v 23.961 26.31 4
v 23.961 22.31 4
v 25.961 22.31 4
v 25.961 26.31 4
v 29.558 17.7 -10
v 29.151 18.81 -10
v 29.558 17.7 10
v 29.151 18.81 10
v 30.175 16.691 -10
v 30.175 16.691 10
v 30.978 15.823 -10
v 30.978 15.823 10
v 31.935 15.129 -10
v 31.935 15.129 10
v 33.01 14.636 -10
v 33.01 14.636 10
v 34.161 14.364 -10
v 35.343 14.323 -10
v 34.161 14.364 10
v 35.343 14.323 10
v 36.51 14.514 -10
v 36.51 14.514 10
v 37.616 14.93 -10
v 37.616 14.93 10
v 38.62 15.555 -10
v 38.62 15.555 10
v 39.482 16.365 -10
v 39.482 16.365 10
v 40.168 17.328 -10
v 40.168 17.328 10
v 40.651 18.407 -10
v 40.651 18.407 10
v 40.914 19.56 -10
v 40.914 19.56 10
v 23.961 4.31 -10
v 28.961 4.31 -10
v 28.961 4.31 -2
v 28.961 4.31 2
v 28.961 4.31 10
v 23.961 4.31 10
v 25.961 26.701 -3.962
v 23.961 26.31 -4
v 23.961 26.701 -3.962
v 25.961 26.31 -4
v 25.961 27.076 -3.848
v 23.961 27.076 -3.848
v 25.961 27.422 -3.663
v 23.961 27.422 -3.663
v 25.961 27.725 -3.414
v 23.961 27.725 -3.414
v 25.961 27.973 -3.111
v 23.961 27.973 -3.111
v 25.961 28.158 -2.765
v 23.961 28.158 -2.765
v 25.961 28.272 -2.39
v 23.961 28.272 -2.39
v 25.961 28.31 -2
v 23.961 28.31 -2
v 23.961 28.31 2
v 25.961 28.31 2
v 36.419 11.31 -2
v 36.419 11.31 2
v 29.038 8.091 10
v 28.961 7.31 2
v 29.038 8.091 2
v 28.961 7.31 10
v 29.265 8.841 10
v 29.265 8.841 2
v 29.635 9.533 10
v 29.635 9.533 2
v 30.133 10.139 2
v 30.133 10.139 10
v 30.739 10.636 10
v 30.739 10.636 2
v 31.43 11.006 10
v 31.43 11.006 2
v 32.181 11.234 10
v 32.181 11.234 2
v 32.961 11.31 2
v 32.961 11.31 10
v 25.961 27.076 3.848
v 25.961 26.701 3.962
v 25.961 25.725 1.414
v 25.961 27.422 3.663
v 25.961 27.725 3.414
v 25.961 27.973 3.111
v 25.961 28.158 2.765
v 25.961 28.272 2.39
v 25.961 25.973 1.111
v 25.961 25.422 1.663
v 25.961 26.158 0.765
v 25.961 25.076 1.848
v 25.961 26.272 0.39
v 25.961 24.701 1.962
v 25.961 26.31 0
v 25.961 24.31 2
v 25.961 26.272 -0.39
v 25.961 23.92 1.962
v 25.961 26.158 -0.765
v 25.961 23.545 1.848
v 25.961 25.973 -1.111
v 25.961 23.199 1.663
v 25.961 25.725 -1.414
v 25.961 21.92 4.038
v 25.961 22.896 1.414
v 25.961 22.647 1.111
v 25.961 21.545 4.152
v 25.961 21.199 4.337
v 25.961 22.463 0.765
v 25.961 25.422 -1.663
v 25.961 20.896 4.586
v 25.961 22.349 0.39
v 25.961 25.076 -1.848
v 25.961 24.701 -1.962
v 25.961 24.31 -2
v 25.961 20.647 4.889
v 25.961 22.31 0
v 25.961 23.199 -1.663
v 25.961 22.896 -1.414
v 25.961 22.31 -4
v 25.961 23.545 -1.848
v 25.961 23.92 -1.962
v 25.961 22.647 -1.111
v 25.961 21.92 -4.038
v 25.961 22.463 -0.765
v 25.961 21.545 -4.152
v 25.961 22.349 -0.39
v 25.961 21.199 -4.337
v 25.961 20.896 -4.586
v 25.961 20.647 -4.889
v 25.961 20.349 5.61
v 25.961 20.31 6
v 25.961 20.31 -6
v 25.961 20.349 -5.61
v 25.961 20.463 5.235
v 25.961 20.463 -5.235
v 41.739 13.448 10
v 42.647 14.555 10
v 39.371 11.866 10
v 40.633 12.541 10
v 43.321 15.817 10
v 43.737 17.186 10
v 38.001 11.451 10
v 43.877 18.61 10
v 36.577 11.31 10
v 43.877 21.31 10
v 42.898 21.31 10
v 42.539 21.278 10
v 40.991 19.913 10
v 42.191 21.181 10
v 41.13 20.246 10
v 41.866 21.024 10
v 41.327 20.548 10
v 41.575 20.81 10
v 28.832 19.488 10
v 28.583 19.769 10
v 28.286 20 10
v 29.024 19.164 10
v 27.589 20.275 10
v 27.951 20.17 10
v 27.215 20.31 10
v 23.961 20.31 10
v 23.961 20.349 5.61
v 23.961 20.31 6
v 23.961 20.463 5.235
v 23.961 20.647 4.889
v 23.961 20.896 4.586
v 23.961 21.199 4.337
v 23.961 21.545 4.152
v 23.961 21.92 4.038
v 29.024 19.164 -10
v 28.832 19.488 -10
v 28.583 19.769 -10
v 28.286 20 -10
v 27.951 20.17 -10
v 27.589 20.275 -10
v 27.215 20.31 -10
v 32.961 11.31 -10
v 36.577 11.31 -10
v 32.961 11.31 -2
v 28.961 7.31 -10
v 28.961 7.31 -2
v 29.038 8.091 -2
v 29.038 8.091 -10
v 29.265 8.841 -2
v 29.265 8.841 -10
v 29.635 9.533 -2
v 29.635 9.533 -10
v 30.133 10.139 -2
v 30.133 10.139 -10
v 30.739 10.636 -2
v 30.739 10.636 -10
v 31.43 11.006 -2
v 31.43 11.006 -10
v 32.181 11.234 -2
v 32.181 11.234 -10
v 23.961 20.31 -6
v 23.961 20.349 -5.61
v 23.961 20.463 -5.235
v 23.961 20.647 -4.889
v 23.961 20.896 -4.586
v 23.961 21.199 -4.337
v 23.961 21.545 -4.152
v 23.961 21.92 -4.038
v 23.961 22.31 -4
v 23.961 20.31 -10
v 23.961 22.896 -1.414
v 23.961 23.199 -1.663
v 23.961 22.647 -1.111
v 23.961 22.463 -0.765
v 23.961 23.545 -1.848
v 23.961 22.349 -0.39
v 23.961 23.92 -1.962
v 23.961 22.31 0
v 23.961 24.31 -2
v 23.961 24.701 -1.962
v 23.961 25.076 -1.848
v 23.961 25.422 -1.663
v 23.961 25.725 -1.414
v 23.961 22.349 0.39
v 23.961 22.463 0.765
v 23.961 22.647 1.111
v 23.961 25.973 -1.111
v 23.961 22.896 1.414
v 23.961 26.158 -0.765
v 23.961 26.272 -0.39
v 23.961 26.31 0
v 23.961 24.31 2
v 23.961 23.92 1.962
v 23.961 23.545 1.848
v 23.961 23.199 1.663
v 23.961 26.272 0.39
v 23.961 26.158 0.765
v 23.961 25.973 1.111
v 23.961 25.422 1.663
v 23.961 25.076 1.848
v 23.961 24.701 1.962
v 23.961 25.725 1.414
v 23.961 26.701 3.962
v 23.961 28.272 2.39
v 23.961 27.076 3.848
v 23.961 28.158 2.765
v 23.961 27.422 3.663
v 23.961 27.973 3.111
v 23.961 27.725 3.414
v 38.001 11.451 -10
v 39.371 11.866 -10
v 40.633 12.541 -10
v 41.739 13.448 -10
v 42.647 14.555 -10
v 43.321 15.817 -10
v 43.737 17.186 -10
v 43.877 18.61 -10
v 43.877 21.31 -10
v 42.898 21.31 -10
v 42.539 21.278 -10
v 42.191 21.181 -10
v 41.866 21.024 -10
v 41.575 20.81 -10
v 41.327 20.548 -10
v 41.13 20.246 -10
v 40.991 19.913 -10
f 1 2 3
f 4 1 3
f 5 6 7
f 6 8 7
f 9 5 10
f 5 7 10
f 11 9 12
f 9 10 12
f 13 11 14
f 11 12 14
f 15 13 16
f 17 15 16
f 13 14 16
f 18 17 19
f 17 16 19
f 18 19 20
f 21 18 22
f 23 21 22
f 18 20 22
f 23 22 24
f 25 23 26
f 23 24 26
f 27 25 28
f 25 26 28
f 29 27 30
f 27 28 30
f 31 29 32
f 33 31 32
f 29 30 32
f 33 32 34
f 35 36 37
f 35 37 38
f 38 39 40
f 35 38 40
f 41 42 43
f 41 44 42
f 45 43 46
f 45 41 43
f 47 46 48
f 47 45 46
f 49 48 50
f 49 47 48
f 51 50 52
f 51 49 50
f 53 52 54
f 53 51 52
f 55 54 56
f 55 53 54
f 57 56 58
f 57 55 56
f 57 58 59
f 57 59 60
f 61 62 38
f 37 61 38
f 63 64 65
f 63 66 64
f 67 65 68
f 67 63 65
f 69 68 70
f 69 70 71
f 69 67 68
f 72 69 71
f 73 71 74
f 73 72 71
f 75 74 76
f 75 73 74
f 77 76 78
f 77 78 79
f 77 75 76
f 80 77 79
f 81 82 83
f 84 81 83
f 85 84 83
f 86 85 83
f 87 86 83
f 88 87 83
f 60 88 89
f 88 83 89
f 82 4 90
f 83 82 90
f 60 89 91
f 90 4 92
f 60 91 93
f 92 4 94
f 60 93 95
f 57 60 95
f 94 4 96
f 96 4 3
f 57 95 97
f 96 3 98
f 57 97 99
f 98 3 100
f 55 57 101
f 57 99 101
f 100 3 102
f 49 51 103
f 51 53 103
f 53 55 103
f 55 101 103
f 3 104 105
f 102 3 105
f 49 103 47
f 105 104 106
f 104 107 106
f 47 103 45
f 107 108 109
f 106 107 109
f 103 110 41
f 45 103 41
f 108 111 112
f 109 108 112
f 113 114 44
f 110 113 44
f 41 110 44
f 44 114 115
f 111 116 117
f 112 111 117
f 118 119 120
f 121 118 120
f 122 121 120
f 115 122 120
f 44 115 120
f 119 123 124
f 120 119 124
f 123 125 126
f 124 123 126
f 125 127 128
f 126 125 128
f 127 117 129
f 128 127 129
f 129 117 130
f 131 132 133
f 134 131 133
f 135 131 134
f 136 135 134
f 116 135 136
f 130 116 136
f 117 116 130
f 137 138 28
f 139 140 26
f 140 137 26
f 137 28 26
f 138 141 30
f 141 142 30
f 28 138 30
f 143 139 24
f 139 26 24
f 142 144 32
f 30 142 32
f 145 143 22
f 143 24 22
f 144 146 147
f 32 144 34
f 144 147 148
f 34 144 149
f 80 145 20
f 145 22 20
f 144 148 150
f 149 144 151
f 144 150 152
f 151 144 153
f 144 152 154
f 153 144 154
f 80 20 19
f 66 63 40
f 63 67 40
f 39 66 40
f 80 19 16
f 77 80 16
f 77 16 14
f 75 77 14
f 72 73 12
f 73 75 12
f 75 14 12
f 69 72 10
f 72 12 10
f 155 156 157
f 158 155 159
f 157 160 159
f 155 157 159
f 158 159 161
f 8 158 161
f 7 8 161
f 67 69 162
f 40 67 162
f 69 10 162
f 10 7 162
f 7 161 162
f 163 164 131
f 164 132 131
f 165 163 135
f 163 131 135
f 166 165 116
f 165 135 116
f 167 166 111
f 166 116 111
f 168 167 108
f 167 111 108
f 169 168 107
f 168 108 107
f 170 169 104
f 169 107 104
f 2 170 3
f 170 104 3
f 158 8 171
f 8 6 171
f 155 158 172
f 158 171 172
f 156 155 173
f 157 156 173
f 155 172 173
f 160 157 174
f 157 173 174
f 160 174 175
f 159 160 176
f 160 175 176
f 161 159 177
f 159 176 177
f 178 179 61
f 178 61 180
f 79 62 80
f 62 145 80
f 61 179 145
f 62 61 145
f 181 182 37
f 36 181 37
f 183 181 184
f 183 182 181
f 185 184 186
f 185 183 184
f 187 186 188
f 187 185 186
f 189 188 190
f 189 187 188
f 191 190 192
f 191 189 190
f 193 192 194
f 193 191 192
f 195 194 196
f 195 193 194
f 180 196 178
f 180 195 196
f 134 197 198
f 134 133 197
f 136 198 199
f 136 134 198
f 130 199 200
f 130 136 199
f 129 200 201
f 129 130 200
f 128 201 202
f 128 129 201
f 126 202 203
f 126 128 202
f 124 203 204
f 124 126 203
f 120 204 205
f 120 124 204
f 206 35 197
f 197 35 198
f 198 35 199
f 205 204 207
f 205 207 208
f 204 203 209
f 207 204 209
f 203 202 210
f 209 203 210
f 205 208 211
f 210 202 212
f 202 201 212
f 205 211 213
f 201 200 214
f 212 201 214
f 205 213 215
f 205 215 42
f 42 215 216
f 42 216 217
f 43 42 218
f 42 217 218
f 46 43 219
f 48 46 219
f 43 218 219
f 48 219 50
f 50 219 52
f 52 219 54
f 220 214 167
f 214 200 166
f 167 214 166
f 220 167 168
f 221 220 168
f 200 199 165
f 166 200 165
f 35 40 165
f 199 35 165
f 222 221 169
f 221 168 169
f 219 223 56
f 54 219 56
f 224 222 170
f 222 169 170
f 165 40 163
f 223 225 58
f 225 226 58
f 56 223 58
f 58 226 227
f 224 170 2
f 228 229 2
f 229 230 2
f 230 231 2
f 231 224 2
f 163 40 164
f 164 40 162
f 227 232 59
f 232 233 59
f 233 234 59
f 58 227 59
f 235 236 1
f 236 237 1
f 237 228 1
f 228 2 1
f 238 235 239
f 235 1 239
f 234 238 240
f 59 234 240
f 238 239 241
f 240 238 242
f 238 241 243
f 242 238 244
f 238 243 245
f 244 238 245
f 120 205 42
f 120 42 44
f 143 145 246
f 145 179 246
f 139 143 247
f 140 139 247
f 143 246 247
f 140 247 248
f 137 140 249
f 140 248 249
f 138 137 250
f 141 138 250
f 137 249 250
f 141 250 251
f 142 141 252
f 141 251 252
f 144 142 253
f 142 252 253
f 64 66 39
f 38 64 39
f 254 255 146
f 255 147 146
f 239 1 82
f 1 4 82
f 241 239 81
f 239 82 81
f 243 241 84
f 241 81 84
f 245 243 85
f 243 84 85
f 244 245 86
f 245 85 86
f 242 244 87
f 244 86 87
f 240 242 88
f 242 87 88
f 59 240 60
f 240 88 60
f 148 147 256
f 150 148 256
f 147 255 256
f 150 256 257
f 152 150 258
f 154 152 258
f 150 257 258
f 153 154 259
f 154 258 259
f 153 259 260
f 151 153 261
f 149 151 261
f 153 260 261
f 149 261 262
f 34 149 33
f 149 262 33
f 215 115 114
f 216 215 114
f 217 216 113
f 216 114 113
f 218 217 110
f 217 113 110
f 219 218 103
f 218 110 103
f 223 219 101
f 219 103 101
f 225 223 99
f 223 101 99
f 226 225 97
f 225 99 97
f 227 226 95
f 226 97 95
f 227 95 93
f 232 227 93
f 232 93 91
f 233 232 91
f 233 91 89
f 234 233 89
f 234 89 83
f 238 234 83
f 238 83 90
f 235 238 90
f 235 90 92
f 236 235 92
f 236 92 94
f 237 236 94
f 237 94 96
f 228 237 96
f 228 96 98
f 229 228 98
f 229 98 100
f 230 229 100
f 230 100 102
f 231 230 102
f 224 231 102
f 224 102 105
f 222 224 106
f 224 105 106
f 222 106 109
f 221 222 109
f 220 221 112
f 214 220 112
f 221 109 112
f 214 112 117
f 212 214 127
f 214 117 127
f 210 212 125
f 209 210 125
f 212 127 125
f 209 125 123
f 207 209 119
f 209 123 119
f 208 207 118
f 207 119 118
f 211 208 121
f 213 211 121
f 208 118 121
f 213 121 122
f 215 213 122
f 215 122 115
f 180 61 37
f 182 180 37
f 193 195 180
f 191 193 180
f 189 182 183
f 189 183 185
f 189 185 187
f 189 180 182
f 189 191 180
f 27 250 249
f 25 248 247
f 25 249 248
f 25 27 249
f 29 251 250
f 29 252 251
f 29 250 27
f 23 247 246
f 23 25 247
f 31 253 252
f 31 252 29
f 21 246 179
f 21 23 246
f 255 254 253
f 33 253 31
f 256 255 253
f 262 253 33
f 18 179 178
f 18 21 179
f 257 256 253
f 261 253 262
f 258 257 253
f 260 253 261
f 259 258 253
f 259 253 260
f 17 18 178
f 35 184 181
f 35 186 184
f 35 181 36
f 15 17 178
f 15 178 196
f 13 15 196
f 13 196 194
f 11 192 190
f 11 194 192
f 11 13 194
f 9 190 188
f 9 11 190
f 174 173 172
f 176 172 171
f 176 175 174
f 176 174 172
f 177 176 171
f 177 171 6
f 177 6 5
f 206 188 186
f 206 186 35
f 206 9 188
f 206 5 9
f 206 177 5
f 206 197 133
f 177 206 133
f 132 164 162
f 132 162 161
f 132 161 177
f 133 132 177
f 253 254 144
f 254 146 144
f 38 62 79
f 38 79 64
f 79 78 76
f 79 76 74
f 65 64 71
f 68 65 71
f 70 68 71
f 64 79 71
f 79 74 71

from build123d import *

# Parameters (mm, degrees)
SALIENTE_EXTRUIR1_DEPTH      = 10
SALIENTE_EXTRUIR1_DEPTH_BACK = 10
SALIENTE_EXTRUIR2_DEPTH      = 2
SALIENTE_EXTRUIR2_DEPTH_BACK = 2
REDONDEO1_R                  = 4
REDONDEO4_R                  = 7.3
REDONDEO2_R                  = 2
CROQUIS4_W                   = 2
CROQUIS4_H                   = 8
SALIENTE_EXTRUIR3_DEPTH      = 8
REDONDEO3_R                  = 2
CORTAR_EXTRUIR1_REACH        = 36.964
CROQUIS5_R                   = 2


with BuildPart() as part:
    # Croquis2 → Saliente-Extruir1 (new, two sides: drawn at the far end of the back side and taken through both)
    with BuildSketch(Plane.XY.offset(-SALIENTE_EXTRUIR1_DEPTH_BACK)):
        with BuildLine():
            Line((23.96097083, 4.310370238), (23.96097083, 20.310370238))
            Line((23.96097083, 20.310370238), (28.96097083, 20.310370238))
            ThreePointArc((28.96097083, 20.310370238), (35.462728392, 14.331387102), (40.877050613, 21.310370238))
            Line((40.877050613, 21.310370238), (43.877050613, 21.310370238))
            Line((43.877050613, 21.310370238), (43.877050613, 11.310370238))
            Line((43.877050613, 11.310370238), (28.96097083, 11.310370238))
            Line((28.96097083, 11.310370238), (28.96097083, 4.310370238))
            Line((28.96097083, 4.310370238), (23.96097083, 4.310370238))
        make_face()
    extrude(amount=SALIENTE_EXTRUIR1_DEPTH + SALIENTE_EXTRUIR1_DEPTH_BACK)

    # Croquis3 → Saliente-Extruir2 (add, two sides: drawn at the far end of the back side and taken through both)
    with BuildSketch(Plane.XY.offset(-SALIENTE_EXTRUIR2_DEPTH_BACK)):
        Polygon((28.96097083, 4.310370238), (28.96097083, 11.310370238), (36.419010722, 11.310370238), align=None)
    extrude(amount=SALIENTE_EXTRUIR2_DEPTH + SALIENTE_EXTRUIR2_DEPTH_BACK)

    # Redondeo1
    redondeo1_edges = [part.edges().sort_by_distance(p)[0] for p in [
        (28.96097083, 11.310370238, -6),
        (28.96097083, 11.310370238, 6),
    ]]
    fillet(redondeo1_edges, radius=REDONDEO1_R)

    # Redondeo4
    redondeo4_edges = [part.edges().sort_by_distance(p)[0] for p in [
        (43.877050613, 11.310370238, 0),
    ]]
    fillet(redondeo4_edges, radius=REDONDEO4_R)

    # Redondeo2
    redondeo2_edges = [part.edges().sort_by_distance(p)[0] for p in [
        (28.96097083, 20.310370238, 0),
        (40.877050613, 21.310370238, 0),
    ]]
    fillet(redondeo2_edges, radius=REDONDEO2_R)

    # Croquis4 → Saliente-Extruir3 (add)
    with BuildSketch(Plane(origin=(0, 20.310370238, 0), x_dir=(1, 0, 0), z_dir=(0, 1, 0))):
        with Locations((24.96097083, 0)):
            Rectangle(CROQUIS4_W, CROQUIS4_H)
    extrude(amount=SALIENTE_EXTRUIR3_DEPTH)

    # Redondeo3
    redondeo3_edges = [part.edges().sort_by_distance(p)[0] for p in [
        (24.96097083, 28.310370238, 4),
        (24.96097083, 28.310370238, -4),
        (24.96097083, 20.310370238, -4),
        (24.96097083, 20.310370238, 4),
    ]]
    fillet(redondeo3_edges, radius=REDONDEO3_R)

    # Croquis5 → Cortar-Extruir1 (cut, up to next)
    with BuildSketch(Plane(origin=(25.96097083, 0, 0), x_dir=(0, 0, -1), z_dir=(1, 0, 0)), mode=Mode.PRIVATE) as cortar_extruir1_sk1:
        with Locations((0, 24.310370238)):
            Circle(CROQUIS5_R)
    cortar_extruir1_tool1 = extrude(cortar_extruir1_sk1.sketch, amount=-CORTAR_EXTRUIR1_REACH, mode=Mode.PRIVATE) & part.part
    add(cortar_extruir1_tool1.solids().sort_by_distance((25.960971, 24.31037, 0))[0], mode=Mode.SUBTRACT)


solid = part.part
